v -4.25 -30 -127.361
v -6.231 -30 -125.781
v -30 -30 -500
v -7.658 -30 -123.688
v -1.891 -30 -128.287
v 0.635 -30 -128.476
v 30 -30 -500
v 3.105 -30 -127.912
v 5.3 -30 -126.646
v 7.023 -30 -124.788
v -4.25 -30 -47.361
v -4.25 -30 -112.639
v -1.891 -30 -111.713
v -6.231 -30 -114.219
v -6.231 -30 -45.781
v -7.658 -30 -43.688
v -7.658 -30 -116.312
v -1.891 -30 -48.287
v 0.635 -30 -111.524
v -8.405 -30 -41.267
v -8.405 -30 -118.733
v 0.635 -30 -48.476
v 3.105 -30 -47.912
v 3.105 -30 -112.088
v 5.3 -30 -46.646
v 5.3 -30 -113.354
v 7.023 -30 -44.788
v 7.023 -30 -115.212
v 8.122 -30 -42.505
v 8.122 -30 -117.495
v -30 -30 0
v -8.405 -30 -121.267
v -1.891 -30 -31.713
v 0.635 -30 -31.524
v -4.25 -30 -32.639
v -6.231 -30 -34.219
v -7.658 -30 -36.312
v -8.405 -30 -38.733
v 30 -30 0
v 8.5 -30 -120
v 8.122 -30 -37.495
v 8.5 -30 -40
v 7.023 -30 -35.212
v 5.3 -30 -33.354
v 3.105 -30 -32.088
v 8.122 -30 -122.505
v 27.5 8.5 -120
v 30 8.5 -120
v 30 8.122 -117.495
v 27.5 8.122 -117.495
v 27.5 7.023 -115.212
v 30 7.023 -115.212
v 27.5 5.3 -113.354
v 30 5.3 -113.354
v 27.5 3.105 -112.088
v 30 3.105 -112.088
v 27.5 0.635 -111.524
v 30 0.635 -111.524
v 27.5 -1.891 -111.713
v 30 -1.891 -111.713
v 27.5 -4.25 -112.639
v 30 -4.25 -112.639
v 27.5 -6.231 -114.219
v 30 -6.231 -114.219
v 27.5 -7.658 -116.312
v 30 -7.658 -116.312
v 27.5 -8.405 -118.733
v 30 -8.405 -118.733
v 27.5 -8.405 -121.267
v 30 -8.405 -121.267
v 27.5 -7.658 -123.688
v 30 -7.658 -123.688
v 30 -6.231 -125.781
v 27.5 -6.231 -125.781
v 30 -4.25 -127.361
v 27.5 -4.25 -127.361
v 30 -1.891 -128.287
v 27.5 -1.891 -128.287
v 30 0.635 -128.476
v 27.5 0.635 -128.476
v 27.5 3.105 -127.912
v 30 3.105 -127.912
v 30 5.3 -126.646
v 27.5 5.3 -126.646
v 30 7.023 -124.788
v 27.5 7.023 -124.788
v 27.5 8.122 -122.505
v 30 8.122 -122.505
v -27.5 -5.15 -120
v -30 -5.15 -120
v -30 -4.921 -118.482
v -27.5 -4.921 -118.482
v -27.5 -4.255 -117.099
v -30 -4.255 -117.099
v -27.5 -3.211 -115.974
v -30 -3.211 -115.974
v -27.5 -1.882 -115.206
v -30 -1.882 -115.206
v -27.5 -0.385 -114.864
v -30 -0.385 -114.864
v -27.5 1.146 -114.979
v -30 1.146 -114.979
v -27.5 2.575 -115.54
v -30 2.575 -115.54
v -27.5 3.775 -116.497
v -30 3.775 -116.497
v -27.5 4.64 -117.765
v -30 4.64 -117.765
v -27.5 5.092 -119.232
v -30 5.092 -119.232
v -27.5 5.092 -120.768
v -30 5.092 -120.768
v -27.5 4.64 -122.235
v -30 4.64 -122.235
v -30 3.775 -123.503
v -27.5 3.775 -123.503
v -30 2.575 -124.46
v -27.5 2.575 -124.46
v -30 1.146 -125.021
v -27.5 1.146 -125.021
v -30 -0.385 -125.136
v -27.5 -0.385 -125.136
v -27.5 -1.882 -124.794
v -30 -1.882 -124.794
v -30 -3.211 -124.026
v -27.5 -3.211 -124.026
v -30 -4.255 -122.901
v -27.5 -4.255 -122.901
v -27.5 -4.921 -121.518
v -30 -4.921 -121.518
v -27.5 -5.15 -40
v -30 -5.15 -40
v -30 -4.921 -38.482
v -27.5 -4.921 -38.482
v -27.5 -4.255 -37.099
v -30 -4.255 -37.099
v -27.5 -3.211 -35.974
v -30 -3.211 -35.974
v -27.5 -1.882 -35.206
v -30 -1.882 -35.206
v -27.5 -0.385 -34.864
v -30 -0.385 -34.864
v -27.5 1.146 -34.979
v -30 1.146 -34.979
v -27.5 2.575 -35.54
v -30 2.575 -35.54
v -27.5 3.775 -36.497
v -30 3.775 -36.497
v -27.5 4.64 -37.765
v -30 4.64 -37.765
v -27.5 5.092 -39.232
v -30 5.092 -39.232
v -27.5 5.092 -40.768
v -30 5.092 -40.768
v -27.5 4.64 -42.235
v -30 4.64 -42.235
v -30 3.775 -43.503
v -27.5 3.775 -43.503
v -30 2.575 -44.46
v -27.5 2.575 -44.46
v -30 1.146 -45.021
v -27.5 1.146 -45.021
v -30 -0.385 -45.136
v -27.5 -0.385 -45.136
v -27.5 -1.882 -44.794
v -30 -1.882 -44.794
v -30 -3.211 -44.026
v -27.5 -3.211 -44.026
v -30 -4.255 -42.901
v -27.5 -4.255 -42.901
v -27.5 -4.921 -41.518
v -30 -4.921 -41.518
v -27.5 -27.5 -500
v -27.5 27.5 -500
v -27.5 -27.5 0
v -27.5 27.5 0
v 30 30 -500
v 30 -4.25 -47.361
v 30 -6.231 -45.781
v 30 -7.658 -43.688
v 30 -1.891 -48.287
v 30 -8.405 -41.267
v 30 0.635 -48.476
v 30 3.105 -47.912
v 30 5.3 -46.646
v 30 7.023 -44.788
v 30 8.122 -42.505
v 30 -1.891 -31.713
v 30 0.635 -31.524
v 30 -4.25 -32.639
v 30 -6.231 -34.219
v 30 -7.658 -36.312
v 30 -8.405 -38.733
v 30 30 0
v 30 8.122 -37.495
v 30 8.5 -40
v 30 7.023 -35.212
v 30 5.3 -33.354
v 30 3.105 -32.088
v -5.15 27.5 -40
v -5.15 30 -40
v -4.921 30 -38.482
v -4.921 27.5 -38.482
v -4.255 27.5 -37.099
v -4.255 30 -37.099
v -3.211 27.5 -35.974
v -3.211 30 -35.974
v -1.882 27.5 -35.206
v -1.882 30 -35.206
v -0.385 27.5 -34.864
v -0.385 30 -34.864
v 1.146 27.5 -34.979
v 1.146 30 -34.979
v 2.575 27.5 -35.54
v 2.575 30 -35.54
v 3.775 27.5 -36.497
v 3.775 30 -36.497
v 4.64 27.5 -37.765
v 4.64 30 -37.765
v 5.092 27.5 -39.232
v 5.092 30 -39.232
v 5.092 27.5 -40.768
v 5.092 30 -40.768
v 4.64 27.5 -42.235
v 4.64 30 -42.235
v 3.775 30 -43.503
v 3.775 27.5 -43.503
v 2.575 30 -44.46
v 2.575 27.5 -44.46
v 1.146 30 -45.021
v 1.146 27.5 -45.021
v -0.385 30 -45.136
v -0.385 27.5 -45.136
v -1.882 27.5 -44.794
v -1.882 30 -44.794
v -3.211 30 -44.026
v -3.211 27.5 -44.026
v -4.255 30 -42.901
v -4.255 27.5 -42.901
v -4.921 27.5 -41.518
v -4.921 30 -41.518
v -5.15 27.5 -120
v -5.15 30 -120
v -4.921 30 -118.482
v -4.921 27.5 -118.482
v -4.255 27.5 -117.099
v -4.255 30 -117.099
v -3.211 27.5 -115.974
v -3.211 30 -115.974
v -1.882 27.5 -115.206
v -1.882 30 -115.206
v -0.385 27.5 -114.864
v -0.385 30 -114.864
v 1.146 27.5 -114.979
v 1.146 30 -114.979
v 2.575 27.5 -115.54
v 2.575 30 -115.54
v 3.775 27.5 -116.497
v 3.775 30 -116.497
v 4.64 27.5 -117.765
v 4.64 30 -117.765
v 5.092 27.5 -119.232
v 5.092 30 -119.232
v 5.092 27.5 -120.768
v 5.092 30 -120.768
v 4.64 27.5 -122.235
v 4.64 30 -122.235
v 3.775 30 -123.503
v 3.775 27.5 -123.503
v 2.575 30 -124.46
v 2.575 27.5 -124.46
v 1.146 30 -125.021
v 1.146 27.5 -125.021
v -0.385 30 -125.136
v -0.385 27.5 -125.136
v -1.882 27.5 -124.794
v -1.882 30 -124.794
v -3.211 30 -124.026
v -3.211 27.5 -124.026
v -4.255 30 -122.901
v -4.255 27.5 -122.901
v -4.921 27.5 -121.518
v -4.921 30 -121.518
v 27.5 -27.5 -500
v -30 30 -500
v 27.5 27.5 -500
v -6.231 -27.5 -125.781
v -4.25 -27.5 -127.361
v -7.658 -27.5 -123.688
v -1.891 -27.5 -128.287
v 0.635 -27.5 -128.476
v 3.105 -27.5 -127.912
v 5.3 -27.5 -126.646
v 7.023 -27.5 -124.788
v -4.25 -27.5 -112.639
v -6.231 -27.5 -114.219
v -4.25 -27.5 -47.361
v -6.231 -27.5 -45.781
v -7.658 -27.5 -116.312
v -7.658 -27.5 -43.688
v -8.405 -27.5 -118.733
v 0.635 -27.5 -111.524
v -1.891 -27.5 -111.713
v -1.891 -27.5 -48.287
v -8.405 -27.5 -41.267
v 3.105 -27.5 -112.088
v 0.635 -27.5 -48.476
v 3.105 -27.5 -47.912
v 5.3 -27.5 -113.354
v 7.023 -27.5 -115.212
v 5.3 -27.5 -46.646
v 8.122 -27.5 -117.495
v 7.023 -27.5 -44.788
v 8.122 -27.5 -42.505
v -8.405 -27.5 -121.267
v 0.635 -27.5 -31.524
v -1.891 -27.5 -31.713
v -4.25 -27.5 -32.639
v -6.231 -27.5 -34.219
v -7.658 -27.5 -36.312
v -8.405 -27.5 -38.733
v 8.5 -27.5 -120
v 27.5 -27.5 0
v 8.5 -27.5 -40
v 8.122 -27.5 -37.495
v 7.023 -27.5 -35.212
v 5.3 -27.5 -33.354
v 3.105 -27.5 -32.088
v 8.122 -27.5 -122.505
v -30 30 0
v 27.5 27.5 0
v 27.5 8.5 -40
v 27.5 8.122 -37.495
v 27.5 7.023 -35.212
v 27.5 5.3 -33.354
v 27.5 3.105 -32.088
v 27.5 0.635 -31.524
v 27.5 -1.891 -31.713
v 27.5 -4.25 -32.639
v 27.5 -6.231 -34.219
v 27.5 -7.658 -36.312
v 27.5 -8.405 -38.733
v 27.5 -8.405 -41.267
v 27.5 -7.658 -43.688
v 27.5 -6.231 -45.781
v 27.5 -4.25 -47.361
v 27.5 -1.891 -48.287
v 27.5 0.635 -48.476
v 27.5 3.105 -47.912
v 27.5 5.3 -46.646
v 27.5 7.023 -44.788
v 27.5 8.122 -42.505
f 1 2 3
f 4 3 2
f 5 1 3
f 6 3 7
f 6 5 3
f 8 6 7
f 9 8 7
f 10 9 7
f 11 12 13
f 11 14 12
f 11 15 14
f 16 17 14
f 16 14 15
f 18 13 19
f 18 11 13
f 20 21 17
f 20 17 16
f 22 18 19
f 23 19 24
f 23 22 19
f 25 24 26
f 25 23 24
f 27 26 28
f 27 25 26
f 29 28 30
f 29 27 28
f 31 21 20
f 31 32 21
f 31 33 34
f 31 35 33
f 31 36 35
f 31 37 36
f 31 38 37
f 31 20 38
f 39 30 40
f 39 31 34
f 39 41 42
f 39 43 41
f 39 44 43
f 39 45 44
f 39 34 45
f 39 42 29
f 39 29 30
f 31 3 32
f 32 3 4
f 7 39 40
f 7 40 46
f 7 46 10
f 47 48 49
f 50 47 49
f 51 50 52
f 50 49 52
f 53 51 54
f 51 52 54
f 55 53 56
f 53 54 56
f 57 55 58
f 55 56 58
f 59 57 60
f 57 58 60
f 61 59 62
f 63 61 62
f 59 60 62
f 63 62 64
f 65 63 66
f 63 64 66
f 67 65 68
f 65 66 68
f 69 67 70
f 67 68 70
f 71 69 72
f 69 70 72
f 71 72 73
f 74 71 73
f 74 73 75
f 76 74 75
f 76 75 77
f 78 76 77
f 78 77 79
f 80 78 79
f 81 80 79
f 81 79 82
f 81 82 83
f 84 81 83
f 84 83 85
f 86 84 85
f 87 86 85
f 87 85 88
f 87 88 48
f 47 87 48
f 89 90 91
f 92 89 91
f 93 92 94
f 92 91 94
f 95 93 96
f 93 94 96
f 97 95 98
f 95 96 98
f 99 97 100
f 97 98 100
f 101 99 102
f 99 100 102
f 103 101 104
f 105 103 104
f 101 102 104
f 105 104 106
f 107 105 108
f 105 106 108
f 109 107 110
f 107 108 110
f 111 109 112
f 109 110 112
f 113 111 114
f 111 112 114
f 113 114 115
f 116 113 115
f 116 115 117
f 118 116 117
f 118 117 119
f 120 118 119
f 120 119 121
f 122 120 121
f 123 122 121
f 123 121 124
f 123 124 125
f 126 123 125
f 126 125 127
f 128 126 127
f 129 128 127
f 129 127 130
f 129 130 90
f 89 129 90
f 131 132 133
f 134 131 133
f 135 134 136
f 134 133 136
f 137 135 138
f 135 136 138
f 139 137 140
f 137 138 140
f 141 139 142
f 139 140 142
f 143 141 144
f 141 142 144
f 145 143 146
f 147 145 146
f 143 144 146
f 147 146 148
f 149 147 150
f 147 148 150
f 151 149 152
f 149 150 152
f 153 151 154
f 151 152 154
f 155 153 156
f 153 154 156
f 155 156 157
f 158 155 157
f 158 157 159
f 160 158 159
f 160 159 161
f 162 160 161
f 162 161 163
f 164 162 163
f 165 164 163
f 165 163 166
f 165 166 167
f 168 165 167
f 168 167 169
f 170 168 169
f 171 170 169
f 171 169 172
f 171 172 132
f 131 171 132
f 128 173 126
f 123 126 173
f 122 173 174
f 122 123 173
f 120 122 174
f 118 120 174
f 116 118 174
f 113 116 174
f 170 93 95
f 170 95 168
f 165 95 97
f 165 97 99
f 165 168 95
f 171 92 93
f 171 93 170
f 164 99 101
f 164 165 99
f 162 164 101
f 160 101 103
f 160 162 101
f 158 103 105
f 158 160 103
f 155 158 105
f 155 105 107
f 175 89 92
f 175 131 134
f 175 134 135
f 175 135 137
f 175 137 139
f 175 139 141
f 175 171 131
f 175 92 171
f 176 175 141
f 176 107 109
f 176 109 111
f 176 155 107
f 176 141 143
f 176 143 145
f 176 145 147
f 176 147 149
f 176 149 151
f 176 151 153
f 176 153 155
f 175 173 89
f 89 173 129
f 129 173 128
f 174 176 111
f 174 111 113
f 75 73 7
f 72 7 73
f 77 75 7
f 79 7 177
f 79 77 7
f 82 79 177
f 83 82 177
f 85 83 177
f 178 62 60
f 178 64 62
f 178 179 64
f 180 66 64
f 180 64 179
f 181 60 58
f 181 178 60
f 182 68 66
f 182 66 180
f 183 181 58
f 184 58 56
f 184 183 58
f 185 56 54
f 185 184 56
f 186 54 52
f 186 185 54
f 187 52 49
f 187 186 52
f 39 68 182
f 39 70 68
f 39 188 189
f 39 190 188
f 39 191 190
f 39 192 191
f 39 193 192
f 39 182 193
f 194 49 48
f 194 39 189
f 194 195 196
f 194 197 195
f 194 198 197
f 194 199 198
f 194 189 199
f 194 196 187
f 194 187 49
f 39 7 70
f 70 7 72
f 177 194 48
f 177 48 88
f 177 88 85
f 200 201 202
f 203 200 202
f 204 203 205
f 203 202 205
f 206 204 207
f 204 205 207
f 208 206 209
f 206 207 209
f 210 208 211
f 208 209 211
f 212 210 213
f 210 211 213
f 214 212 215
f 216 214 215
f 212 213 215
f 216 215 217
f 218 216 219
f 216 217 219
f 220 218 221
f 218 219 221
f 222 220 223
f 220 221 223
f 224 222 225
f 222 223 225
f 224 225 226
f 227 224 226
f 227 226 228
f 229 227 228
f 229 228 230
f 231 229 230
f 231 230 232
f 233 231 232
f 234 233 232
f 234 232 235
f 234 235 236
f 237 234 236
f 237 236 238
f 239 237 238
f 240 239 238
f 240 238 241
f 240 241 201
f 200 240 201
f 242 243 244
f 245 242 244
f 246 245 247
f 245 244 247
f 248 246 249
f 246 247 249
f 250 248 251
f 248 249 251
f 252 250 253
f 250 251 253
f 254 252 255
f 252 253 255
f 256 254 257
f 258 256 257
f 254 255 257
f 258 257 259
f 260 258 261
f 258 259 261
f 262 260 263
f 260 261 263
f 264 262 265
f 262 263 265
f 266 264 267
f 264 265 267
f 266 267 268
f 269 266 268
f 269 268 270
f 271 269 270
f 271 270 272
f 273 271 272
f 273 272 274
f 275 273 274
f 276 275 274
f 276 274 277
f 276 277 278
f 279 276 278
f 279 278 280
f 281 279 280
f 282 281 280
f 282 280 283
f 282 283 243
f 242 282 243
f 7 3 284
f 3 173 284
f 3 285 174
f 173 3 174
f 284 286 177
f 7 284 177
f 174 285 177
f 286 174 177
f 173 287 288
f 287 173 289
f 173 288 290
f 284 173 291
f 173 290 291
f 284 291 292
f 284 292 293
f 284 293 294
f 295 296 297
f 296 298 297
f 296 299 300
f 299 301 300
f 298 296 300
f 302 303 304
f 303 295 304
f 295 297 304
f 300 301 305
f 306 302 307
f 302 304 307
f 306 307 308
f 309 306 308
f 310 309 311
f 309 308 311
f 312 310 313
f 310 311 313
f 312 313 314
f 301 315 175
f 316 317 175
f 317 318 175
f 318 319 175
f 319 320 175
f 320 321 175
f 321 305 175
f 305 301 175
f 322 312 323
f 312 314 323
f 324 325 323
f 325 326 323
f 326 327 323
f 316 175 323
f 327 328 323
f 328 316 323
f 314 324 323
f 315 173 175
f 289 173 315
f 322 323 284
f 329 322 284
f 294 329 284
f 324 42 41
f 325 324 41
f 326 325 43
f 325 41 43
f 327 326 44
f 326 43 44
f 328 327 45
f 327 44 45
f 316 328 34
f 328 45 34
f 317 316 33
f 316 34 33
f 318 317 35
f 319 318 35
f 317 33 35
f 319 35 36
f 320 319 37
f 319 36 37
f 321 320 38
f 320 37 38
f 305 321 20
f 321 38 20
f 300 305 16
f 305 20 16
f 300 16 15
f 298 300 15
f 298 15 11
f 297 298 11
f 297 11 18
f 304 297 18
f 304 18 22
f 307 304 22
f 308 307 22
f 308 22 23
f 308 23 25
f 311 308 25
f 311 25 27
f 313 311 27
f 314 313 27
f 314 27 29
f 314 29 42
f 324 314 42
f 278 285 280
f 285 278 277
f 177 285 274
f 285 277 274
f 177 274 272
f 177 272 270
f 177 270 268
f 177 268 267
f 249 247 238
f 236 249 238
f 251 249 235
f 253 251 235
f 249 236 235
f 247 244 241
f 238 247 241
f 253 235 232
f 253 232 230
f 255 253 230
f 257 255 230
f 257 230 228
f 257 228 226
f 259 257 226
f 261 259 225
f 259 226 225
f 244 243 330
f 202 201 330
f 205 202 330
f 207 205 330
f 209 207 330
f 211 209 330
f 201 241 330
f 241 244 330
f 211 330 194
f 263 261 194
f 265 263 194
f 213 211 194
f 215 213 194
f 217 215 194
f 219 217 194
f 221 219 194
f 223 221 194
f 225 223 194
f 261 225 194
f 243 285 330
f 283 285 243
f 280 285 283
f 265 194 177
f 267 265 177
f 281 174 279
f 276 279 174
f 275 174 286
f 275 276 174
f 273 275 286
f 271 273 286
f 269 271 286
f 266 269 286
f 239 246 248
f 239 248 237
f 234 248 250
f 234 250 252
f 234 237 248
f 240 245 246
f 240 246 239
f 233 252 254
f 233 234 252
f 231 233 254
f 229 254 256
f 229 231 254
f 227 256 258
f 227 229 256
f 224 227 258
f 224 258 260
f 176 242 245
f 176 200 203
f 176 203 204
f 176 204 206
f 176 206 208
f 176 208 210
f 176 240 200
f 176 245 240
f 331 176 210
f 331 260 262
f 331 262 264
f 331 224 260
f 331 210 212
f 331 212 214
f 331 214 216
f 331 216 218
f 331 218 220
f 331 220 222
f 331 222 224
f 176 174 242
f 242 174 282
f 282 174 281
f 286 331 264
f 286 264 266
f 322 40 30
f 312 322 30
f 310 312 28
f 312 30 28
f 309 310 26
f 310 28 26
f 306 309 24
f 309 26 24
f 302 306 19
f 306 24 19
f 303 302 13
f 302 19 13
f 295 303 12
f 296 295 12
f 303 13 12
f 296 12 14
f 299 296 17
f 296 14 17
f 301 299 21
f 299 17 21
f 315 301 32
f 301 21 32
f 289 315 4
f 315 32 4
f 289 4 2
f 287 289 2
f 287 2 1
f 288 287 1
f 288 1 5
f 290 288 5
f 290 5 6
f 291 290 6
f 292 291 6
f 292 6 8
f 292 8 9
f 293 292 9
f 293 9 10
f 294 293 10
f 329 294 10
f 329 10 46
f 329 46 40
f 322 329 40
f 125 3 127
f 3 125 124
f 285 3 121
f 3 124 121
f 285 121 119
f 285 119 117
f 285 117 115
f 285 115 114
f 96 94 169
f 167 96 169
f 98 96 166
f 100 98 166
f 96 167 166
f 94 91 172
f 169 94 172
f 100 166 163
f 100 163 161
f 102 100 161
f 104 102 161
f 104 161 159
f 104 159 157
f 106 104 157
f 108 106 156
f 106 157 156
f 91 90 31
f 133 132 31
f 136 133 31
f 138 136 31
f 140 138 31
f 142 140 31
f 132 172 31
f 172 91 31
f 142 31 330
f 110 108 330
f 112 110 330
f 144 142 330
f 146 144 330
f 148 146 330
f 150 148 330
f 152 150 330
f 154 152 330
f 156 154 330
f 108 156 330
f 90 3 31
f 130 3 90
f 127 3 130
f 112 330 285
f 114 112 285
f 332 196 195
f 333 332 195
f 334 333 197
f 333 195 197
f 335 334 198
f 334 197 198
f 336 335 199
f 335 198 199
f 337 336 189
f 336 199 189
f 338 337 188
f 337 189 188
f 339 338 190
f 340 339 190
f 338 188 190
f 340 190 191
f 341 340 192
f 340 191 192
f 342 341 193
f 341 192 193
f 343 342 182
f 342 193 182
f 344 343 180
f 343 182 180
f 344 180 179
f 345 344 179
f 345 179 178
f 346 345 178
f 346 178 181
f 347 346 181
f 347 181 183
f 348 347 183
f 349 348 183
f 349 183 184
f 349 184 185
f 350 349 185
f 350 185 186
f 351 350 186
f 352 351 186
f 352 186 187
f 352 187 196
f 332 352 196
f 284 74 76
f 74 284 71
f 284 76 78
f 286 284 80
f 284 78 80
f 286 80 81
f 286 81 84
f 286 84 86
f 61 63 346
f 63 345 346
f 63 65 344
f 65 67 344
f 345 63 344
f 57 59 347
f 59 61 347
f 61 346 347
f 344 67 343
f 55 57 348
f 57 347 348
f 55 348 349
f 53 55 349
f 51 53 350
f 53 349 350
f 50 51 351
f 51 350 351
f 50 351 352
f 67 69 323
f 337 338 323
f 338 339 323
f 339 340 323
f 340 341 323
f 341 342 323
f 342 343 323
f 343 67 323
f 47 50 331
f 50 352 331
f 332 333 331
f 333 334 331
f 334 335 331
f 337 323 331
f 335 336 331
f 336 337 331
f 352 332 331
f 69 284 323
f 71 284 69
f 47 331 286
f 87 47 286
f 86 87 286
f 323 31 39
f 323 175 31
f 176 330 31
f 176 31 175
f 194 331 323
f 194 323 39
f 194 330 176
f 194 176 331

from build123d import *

# Parameters (mm, degrees)
F0_W     = 60
F0_H     = 60
F0_W_2   = 55
F0_H_2   = 55
F1_DEPTH = 500
F2_R     = 8.5
F3_DEPTH = 5
F4_R     = 8.5
F5_DEPTH = 5
F6_R     = 5.15
F7_DEPTH = 5
F8_R     = 5.15
F9_DEPTH = 5


with BuildPart() as f1:
    # F0 (on Top) → F1 (new body)
    with BuildSketch(Plane.XY):
        Rectangle(F0_W, F0_H)
        Rectangle(F0_W_2, F0_H_2, mode=Mode.SUBTRACT)
    extrude(amount=-F1_DEPTH)

    # F2 (on face) → F3 (cut)
    with BuildSketch(Plane.XZ.offset(30)):
        with Locations((0, -40)):
            Circle(F2_R)
        with Locations((0, -120)):
            Circle(F2_R)
    extrude(amount=-F3_DEPTH, mode=Mode.SUBTRACT)

    # F4 (on face) → F5 (cut)
    with BuildSketch(Plane.YZ.offset(30)):
        with Locations((0, -40)):
            Circle(F4_R)
        with Locations((0, -120)):
            Circle(F4_R)
    extrude(amount=-F5_DEPTH, mode=Mode.SUBTRACT)

    # F6 (on face) → F7 (cut)
    with BuildSketch(Plane(origin=(-30, 0, 0), x_dir=(0, -1, 0), z_dir=(-1, 0, 0))):
        with Locations((0, -40)):
            Circle(F6_R)
        with Locations((0, -120)):
            Circle(F6_R)
    extrude(amount=-F7_DEPTH, mode=Mode.SUBTRACT)

    # F8 (on face) → F9 (cut)
    with BuildSketch(Plane(origin=(0, 30, 0), x_dir=(-1, 0, 0), z_dir=(0, 1, 0))):
        with Locations((0, -40)):
            Circle(F8_R)
        with Locations((0, -120)):
            Circle(F8_R)
    extrude(amount=-F9_DEPTH, mode=Mode.SUBTRACT)


solid = f1.part
